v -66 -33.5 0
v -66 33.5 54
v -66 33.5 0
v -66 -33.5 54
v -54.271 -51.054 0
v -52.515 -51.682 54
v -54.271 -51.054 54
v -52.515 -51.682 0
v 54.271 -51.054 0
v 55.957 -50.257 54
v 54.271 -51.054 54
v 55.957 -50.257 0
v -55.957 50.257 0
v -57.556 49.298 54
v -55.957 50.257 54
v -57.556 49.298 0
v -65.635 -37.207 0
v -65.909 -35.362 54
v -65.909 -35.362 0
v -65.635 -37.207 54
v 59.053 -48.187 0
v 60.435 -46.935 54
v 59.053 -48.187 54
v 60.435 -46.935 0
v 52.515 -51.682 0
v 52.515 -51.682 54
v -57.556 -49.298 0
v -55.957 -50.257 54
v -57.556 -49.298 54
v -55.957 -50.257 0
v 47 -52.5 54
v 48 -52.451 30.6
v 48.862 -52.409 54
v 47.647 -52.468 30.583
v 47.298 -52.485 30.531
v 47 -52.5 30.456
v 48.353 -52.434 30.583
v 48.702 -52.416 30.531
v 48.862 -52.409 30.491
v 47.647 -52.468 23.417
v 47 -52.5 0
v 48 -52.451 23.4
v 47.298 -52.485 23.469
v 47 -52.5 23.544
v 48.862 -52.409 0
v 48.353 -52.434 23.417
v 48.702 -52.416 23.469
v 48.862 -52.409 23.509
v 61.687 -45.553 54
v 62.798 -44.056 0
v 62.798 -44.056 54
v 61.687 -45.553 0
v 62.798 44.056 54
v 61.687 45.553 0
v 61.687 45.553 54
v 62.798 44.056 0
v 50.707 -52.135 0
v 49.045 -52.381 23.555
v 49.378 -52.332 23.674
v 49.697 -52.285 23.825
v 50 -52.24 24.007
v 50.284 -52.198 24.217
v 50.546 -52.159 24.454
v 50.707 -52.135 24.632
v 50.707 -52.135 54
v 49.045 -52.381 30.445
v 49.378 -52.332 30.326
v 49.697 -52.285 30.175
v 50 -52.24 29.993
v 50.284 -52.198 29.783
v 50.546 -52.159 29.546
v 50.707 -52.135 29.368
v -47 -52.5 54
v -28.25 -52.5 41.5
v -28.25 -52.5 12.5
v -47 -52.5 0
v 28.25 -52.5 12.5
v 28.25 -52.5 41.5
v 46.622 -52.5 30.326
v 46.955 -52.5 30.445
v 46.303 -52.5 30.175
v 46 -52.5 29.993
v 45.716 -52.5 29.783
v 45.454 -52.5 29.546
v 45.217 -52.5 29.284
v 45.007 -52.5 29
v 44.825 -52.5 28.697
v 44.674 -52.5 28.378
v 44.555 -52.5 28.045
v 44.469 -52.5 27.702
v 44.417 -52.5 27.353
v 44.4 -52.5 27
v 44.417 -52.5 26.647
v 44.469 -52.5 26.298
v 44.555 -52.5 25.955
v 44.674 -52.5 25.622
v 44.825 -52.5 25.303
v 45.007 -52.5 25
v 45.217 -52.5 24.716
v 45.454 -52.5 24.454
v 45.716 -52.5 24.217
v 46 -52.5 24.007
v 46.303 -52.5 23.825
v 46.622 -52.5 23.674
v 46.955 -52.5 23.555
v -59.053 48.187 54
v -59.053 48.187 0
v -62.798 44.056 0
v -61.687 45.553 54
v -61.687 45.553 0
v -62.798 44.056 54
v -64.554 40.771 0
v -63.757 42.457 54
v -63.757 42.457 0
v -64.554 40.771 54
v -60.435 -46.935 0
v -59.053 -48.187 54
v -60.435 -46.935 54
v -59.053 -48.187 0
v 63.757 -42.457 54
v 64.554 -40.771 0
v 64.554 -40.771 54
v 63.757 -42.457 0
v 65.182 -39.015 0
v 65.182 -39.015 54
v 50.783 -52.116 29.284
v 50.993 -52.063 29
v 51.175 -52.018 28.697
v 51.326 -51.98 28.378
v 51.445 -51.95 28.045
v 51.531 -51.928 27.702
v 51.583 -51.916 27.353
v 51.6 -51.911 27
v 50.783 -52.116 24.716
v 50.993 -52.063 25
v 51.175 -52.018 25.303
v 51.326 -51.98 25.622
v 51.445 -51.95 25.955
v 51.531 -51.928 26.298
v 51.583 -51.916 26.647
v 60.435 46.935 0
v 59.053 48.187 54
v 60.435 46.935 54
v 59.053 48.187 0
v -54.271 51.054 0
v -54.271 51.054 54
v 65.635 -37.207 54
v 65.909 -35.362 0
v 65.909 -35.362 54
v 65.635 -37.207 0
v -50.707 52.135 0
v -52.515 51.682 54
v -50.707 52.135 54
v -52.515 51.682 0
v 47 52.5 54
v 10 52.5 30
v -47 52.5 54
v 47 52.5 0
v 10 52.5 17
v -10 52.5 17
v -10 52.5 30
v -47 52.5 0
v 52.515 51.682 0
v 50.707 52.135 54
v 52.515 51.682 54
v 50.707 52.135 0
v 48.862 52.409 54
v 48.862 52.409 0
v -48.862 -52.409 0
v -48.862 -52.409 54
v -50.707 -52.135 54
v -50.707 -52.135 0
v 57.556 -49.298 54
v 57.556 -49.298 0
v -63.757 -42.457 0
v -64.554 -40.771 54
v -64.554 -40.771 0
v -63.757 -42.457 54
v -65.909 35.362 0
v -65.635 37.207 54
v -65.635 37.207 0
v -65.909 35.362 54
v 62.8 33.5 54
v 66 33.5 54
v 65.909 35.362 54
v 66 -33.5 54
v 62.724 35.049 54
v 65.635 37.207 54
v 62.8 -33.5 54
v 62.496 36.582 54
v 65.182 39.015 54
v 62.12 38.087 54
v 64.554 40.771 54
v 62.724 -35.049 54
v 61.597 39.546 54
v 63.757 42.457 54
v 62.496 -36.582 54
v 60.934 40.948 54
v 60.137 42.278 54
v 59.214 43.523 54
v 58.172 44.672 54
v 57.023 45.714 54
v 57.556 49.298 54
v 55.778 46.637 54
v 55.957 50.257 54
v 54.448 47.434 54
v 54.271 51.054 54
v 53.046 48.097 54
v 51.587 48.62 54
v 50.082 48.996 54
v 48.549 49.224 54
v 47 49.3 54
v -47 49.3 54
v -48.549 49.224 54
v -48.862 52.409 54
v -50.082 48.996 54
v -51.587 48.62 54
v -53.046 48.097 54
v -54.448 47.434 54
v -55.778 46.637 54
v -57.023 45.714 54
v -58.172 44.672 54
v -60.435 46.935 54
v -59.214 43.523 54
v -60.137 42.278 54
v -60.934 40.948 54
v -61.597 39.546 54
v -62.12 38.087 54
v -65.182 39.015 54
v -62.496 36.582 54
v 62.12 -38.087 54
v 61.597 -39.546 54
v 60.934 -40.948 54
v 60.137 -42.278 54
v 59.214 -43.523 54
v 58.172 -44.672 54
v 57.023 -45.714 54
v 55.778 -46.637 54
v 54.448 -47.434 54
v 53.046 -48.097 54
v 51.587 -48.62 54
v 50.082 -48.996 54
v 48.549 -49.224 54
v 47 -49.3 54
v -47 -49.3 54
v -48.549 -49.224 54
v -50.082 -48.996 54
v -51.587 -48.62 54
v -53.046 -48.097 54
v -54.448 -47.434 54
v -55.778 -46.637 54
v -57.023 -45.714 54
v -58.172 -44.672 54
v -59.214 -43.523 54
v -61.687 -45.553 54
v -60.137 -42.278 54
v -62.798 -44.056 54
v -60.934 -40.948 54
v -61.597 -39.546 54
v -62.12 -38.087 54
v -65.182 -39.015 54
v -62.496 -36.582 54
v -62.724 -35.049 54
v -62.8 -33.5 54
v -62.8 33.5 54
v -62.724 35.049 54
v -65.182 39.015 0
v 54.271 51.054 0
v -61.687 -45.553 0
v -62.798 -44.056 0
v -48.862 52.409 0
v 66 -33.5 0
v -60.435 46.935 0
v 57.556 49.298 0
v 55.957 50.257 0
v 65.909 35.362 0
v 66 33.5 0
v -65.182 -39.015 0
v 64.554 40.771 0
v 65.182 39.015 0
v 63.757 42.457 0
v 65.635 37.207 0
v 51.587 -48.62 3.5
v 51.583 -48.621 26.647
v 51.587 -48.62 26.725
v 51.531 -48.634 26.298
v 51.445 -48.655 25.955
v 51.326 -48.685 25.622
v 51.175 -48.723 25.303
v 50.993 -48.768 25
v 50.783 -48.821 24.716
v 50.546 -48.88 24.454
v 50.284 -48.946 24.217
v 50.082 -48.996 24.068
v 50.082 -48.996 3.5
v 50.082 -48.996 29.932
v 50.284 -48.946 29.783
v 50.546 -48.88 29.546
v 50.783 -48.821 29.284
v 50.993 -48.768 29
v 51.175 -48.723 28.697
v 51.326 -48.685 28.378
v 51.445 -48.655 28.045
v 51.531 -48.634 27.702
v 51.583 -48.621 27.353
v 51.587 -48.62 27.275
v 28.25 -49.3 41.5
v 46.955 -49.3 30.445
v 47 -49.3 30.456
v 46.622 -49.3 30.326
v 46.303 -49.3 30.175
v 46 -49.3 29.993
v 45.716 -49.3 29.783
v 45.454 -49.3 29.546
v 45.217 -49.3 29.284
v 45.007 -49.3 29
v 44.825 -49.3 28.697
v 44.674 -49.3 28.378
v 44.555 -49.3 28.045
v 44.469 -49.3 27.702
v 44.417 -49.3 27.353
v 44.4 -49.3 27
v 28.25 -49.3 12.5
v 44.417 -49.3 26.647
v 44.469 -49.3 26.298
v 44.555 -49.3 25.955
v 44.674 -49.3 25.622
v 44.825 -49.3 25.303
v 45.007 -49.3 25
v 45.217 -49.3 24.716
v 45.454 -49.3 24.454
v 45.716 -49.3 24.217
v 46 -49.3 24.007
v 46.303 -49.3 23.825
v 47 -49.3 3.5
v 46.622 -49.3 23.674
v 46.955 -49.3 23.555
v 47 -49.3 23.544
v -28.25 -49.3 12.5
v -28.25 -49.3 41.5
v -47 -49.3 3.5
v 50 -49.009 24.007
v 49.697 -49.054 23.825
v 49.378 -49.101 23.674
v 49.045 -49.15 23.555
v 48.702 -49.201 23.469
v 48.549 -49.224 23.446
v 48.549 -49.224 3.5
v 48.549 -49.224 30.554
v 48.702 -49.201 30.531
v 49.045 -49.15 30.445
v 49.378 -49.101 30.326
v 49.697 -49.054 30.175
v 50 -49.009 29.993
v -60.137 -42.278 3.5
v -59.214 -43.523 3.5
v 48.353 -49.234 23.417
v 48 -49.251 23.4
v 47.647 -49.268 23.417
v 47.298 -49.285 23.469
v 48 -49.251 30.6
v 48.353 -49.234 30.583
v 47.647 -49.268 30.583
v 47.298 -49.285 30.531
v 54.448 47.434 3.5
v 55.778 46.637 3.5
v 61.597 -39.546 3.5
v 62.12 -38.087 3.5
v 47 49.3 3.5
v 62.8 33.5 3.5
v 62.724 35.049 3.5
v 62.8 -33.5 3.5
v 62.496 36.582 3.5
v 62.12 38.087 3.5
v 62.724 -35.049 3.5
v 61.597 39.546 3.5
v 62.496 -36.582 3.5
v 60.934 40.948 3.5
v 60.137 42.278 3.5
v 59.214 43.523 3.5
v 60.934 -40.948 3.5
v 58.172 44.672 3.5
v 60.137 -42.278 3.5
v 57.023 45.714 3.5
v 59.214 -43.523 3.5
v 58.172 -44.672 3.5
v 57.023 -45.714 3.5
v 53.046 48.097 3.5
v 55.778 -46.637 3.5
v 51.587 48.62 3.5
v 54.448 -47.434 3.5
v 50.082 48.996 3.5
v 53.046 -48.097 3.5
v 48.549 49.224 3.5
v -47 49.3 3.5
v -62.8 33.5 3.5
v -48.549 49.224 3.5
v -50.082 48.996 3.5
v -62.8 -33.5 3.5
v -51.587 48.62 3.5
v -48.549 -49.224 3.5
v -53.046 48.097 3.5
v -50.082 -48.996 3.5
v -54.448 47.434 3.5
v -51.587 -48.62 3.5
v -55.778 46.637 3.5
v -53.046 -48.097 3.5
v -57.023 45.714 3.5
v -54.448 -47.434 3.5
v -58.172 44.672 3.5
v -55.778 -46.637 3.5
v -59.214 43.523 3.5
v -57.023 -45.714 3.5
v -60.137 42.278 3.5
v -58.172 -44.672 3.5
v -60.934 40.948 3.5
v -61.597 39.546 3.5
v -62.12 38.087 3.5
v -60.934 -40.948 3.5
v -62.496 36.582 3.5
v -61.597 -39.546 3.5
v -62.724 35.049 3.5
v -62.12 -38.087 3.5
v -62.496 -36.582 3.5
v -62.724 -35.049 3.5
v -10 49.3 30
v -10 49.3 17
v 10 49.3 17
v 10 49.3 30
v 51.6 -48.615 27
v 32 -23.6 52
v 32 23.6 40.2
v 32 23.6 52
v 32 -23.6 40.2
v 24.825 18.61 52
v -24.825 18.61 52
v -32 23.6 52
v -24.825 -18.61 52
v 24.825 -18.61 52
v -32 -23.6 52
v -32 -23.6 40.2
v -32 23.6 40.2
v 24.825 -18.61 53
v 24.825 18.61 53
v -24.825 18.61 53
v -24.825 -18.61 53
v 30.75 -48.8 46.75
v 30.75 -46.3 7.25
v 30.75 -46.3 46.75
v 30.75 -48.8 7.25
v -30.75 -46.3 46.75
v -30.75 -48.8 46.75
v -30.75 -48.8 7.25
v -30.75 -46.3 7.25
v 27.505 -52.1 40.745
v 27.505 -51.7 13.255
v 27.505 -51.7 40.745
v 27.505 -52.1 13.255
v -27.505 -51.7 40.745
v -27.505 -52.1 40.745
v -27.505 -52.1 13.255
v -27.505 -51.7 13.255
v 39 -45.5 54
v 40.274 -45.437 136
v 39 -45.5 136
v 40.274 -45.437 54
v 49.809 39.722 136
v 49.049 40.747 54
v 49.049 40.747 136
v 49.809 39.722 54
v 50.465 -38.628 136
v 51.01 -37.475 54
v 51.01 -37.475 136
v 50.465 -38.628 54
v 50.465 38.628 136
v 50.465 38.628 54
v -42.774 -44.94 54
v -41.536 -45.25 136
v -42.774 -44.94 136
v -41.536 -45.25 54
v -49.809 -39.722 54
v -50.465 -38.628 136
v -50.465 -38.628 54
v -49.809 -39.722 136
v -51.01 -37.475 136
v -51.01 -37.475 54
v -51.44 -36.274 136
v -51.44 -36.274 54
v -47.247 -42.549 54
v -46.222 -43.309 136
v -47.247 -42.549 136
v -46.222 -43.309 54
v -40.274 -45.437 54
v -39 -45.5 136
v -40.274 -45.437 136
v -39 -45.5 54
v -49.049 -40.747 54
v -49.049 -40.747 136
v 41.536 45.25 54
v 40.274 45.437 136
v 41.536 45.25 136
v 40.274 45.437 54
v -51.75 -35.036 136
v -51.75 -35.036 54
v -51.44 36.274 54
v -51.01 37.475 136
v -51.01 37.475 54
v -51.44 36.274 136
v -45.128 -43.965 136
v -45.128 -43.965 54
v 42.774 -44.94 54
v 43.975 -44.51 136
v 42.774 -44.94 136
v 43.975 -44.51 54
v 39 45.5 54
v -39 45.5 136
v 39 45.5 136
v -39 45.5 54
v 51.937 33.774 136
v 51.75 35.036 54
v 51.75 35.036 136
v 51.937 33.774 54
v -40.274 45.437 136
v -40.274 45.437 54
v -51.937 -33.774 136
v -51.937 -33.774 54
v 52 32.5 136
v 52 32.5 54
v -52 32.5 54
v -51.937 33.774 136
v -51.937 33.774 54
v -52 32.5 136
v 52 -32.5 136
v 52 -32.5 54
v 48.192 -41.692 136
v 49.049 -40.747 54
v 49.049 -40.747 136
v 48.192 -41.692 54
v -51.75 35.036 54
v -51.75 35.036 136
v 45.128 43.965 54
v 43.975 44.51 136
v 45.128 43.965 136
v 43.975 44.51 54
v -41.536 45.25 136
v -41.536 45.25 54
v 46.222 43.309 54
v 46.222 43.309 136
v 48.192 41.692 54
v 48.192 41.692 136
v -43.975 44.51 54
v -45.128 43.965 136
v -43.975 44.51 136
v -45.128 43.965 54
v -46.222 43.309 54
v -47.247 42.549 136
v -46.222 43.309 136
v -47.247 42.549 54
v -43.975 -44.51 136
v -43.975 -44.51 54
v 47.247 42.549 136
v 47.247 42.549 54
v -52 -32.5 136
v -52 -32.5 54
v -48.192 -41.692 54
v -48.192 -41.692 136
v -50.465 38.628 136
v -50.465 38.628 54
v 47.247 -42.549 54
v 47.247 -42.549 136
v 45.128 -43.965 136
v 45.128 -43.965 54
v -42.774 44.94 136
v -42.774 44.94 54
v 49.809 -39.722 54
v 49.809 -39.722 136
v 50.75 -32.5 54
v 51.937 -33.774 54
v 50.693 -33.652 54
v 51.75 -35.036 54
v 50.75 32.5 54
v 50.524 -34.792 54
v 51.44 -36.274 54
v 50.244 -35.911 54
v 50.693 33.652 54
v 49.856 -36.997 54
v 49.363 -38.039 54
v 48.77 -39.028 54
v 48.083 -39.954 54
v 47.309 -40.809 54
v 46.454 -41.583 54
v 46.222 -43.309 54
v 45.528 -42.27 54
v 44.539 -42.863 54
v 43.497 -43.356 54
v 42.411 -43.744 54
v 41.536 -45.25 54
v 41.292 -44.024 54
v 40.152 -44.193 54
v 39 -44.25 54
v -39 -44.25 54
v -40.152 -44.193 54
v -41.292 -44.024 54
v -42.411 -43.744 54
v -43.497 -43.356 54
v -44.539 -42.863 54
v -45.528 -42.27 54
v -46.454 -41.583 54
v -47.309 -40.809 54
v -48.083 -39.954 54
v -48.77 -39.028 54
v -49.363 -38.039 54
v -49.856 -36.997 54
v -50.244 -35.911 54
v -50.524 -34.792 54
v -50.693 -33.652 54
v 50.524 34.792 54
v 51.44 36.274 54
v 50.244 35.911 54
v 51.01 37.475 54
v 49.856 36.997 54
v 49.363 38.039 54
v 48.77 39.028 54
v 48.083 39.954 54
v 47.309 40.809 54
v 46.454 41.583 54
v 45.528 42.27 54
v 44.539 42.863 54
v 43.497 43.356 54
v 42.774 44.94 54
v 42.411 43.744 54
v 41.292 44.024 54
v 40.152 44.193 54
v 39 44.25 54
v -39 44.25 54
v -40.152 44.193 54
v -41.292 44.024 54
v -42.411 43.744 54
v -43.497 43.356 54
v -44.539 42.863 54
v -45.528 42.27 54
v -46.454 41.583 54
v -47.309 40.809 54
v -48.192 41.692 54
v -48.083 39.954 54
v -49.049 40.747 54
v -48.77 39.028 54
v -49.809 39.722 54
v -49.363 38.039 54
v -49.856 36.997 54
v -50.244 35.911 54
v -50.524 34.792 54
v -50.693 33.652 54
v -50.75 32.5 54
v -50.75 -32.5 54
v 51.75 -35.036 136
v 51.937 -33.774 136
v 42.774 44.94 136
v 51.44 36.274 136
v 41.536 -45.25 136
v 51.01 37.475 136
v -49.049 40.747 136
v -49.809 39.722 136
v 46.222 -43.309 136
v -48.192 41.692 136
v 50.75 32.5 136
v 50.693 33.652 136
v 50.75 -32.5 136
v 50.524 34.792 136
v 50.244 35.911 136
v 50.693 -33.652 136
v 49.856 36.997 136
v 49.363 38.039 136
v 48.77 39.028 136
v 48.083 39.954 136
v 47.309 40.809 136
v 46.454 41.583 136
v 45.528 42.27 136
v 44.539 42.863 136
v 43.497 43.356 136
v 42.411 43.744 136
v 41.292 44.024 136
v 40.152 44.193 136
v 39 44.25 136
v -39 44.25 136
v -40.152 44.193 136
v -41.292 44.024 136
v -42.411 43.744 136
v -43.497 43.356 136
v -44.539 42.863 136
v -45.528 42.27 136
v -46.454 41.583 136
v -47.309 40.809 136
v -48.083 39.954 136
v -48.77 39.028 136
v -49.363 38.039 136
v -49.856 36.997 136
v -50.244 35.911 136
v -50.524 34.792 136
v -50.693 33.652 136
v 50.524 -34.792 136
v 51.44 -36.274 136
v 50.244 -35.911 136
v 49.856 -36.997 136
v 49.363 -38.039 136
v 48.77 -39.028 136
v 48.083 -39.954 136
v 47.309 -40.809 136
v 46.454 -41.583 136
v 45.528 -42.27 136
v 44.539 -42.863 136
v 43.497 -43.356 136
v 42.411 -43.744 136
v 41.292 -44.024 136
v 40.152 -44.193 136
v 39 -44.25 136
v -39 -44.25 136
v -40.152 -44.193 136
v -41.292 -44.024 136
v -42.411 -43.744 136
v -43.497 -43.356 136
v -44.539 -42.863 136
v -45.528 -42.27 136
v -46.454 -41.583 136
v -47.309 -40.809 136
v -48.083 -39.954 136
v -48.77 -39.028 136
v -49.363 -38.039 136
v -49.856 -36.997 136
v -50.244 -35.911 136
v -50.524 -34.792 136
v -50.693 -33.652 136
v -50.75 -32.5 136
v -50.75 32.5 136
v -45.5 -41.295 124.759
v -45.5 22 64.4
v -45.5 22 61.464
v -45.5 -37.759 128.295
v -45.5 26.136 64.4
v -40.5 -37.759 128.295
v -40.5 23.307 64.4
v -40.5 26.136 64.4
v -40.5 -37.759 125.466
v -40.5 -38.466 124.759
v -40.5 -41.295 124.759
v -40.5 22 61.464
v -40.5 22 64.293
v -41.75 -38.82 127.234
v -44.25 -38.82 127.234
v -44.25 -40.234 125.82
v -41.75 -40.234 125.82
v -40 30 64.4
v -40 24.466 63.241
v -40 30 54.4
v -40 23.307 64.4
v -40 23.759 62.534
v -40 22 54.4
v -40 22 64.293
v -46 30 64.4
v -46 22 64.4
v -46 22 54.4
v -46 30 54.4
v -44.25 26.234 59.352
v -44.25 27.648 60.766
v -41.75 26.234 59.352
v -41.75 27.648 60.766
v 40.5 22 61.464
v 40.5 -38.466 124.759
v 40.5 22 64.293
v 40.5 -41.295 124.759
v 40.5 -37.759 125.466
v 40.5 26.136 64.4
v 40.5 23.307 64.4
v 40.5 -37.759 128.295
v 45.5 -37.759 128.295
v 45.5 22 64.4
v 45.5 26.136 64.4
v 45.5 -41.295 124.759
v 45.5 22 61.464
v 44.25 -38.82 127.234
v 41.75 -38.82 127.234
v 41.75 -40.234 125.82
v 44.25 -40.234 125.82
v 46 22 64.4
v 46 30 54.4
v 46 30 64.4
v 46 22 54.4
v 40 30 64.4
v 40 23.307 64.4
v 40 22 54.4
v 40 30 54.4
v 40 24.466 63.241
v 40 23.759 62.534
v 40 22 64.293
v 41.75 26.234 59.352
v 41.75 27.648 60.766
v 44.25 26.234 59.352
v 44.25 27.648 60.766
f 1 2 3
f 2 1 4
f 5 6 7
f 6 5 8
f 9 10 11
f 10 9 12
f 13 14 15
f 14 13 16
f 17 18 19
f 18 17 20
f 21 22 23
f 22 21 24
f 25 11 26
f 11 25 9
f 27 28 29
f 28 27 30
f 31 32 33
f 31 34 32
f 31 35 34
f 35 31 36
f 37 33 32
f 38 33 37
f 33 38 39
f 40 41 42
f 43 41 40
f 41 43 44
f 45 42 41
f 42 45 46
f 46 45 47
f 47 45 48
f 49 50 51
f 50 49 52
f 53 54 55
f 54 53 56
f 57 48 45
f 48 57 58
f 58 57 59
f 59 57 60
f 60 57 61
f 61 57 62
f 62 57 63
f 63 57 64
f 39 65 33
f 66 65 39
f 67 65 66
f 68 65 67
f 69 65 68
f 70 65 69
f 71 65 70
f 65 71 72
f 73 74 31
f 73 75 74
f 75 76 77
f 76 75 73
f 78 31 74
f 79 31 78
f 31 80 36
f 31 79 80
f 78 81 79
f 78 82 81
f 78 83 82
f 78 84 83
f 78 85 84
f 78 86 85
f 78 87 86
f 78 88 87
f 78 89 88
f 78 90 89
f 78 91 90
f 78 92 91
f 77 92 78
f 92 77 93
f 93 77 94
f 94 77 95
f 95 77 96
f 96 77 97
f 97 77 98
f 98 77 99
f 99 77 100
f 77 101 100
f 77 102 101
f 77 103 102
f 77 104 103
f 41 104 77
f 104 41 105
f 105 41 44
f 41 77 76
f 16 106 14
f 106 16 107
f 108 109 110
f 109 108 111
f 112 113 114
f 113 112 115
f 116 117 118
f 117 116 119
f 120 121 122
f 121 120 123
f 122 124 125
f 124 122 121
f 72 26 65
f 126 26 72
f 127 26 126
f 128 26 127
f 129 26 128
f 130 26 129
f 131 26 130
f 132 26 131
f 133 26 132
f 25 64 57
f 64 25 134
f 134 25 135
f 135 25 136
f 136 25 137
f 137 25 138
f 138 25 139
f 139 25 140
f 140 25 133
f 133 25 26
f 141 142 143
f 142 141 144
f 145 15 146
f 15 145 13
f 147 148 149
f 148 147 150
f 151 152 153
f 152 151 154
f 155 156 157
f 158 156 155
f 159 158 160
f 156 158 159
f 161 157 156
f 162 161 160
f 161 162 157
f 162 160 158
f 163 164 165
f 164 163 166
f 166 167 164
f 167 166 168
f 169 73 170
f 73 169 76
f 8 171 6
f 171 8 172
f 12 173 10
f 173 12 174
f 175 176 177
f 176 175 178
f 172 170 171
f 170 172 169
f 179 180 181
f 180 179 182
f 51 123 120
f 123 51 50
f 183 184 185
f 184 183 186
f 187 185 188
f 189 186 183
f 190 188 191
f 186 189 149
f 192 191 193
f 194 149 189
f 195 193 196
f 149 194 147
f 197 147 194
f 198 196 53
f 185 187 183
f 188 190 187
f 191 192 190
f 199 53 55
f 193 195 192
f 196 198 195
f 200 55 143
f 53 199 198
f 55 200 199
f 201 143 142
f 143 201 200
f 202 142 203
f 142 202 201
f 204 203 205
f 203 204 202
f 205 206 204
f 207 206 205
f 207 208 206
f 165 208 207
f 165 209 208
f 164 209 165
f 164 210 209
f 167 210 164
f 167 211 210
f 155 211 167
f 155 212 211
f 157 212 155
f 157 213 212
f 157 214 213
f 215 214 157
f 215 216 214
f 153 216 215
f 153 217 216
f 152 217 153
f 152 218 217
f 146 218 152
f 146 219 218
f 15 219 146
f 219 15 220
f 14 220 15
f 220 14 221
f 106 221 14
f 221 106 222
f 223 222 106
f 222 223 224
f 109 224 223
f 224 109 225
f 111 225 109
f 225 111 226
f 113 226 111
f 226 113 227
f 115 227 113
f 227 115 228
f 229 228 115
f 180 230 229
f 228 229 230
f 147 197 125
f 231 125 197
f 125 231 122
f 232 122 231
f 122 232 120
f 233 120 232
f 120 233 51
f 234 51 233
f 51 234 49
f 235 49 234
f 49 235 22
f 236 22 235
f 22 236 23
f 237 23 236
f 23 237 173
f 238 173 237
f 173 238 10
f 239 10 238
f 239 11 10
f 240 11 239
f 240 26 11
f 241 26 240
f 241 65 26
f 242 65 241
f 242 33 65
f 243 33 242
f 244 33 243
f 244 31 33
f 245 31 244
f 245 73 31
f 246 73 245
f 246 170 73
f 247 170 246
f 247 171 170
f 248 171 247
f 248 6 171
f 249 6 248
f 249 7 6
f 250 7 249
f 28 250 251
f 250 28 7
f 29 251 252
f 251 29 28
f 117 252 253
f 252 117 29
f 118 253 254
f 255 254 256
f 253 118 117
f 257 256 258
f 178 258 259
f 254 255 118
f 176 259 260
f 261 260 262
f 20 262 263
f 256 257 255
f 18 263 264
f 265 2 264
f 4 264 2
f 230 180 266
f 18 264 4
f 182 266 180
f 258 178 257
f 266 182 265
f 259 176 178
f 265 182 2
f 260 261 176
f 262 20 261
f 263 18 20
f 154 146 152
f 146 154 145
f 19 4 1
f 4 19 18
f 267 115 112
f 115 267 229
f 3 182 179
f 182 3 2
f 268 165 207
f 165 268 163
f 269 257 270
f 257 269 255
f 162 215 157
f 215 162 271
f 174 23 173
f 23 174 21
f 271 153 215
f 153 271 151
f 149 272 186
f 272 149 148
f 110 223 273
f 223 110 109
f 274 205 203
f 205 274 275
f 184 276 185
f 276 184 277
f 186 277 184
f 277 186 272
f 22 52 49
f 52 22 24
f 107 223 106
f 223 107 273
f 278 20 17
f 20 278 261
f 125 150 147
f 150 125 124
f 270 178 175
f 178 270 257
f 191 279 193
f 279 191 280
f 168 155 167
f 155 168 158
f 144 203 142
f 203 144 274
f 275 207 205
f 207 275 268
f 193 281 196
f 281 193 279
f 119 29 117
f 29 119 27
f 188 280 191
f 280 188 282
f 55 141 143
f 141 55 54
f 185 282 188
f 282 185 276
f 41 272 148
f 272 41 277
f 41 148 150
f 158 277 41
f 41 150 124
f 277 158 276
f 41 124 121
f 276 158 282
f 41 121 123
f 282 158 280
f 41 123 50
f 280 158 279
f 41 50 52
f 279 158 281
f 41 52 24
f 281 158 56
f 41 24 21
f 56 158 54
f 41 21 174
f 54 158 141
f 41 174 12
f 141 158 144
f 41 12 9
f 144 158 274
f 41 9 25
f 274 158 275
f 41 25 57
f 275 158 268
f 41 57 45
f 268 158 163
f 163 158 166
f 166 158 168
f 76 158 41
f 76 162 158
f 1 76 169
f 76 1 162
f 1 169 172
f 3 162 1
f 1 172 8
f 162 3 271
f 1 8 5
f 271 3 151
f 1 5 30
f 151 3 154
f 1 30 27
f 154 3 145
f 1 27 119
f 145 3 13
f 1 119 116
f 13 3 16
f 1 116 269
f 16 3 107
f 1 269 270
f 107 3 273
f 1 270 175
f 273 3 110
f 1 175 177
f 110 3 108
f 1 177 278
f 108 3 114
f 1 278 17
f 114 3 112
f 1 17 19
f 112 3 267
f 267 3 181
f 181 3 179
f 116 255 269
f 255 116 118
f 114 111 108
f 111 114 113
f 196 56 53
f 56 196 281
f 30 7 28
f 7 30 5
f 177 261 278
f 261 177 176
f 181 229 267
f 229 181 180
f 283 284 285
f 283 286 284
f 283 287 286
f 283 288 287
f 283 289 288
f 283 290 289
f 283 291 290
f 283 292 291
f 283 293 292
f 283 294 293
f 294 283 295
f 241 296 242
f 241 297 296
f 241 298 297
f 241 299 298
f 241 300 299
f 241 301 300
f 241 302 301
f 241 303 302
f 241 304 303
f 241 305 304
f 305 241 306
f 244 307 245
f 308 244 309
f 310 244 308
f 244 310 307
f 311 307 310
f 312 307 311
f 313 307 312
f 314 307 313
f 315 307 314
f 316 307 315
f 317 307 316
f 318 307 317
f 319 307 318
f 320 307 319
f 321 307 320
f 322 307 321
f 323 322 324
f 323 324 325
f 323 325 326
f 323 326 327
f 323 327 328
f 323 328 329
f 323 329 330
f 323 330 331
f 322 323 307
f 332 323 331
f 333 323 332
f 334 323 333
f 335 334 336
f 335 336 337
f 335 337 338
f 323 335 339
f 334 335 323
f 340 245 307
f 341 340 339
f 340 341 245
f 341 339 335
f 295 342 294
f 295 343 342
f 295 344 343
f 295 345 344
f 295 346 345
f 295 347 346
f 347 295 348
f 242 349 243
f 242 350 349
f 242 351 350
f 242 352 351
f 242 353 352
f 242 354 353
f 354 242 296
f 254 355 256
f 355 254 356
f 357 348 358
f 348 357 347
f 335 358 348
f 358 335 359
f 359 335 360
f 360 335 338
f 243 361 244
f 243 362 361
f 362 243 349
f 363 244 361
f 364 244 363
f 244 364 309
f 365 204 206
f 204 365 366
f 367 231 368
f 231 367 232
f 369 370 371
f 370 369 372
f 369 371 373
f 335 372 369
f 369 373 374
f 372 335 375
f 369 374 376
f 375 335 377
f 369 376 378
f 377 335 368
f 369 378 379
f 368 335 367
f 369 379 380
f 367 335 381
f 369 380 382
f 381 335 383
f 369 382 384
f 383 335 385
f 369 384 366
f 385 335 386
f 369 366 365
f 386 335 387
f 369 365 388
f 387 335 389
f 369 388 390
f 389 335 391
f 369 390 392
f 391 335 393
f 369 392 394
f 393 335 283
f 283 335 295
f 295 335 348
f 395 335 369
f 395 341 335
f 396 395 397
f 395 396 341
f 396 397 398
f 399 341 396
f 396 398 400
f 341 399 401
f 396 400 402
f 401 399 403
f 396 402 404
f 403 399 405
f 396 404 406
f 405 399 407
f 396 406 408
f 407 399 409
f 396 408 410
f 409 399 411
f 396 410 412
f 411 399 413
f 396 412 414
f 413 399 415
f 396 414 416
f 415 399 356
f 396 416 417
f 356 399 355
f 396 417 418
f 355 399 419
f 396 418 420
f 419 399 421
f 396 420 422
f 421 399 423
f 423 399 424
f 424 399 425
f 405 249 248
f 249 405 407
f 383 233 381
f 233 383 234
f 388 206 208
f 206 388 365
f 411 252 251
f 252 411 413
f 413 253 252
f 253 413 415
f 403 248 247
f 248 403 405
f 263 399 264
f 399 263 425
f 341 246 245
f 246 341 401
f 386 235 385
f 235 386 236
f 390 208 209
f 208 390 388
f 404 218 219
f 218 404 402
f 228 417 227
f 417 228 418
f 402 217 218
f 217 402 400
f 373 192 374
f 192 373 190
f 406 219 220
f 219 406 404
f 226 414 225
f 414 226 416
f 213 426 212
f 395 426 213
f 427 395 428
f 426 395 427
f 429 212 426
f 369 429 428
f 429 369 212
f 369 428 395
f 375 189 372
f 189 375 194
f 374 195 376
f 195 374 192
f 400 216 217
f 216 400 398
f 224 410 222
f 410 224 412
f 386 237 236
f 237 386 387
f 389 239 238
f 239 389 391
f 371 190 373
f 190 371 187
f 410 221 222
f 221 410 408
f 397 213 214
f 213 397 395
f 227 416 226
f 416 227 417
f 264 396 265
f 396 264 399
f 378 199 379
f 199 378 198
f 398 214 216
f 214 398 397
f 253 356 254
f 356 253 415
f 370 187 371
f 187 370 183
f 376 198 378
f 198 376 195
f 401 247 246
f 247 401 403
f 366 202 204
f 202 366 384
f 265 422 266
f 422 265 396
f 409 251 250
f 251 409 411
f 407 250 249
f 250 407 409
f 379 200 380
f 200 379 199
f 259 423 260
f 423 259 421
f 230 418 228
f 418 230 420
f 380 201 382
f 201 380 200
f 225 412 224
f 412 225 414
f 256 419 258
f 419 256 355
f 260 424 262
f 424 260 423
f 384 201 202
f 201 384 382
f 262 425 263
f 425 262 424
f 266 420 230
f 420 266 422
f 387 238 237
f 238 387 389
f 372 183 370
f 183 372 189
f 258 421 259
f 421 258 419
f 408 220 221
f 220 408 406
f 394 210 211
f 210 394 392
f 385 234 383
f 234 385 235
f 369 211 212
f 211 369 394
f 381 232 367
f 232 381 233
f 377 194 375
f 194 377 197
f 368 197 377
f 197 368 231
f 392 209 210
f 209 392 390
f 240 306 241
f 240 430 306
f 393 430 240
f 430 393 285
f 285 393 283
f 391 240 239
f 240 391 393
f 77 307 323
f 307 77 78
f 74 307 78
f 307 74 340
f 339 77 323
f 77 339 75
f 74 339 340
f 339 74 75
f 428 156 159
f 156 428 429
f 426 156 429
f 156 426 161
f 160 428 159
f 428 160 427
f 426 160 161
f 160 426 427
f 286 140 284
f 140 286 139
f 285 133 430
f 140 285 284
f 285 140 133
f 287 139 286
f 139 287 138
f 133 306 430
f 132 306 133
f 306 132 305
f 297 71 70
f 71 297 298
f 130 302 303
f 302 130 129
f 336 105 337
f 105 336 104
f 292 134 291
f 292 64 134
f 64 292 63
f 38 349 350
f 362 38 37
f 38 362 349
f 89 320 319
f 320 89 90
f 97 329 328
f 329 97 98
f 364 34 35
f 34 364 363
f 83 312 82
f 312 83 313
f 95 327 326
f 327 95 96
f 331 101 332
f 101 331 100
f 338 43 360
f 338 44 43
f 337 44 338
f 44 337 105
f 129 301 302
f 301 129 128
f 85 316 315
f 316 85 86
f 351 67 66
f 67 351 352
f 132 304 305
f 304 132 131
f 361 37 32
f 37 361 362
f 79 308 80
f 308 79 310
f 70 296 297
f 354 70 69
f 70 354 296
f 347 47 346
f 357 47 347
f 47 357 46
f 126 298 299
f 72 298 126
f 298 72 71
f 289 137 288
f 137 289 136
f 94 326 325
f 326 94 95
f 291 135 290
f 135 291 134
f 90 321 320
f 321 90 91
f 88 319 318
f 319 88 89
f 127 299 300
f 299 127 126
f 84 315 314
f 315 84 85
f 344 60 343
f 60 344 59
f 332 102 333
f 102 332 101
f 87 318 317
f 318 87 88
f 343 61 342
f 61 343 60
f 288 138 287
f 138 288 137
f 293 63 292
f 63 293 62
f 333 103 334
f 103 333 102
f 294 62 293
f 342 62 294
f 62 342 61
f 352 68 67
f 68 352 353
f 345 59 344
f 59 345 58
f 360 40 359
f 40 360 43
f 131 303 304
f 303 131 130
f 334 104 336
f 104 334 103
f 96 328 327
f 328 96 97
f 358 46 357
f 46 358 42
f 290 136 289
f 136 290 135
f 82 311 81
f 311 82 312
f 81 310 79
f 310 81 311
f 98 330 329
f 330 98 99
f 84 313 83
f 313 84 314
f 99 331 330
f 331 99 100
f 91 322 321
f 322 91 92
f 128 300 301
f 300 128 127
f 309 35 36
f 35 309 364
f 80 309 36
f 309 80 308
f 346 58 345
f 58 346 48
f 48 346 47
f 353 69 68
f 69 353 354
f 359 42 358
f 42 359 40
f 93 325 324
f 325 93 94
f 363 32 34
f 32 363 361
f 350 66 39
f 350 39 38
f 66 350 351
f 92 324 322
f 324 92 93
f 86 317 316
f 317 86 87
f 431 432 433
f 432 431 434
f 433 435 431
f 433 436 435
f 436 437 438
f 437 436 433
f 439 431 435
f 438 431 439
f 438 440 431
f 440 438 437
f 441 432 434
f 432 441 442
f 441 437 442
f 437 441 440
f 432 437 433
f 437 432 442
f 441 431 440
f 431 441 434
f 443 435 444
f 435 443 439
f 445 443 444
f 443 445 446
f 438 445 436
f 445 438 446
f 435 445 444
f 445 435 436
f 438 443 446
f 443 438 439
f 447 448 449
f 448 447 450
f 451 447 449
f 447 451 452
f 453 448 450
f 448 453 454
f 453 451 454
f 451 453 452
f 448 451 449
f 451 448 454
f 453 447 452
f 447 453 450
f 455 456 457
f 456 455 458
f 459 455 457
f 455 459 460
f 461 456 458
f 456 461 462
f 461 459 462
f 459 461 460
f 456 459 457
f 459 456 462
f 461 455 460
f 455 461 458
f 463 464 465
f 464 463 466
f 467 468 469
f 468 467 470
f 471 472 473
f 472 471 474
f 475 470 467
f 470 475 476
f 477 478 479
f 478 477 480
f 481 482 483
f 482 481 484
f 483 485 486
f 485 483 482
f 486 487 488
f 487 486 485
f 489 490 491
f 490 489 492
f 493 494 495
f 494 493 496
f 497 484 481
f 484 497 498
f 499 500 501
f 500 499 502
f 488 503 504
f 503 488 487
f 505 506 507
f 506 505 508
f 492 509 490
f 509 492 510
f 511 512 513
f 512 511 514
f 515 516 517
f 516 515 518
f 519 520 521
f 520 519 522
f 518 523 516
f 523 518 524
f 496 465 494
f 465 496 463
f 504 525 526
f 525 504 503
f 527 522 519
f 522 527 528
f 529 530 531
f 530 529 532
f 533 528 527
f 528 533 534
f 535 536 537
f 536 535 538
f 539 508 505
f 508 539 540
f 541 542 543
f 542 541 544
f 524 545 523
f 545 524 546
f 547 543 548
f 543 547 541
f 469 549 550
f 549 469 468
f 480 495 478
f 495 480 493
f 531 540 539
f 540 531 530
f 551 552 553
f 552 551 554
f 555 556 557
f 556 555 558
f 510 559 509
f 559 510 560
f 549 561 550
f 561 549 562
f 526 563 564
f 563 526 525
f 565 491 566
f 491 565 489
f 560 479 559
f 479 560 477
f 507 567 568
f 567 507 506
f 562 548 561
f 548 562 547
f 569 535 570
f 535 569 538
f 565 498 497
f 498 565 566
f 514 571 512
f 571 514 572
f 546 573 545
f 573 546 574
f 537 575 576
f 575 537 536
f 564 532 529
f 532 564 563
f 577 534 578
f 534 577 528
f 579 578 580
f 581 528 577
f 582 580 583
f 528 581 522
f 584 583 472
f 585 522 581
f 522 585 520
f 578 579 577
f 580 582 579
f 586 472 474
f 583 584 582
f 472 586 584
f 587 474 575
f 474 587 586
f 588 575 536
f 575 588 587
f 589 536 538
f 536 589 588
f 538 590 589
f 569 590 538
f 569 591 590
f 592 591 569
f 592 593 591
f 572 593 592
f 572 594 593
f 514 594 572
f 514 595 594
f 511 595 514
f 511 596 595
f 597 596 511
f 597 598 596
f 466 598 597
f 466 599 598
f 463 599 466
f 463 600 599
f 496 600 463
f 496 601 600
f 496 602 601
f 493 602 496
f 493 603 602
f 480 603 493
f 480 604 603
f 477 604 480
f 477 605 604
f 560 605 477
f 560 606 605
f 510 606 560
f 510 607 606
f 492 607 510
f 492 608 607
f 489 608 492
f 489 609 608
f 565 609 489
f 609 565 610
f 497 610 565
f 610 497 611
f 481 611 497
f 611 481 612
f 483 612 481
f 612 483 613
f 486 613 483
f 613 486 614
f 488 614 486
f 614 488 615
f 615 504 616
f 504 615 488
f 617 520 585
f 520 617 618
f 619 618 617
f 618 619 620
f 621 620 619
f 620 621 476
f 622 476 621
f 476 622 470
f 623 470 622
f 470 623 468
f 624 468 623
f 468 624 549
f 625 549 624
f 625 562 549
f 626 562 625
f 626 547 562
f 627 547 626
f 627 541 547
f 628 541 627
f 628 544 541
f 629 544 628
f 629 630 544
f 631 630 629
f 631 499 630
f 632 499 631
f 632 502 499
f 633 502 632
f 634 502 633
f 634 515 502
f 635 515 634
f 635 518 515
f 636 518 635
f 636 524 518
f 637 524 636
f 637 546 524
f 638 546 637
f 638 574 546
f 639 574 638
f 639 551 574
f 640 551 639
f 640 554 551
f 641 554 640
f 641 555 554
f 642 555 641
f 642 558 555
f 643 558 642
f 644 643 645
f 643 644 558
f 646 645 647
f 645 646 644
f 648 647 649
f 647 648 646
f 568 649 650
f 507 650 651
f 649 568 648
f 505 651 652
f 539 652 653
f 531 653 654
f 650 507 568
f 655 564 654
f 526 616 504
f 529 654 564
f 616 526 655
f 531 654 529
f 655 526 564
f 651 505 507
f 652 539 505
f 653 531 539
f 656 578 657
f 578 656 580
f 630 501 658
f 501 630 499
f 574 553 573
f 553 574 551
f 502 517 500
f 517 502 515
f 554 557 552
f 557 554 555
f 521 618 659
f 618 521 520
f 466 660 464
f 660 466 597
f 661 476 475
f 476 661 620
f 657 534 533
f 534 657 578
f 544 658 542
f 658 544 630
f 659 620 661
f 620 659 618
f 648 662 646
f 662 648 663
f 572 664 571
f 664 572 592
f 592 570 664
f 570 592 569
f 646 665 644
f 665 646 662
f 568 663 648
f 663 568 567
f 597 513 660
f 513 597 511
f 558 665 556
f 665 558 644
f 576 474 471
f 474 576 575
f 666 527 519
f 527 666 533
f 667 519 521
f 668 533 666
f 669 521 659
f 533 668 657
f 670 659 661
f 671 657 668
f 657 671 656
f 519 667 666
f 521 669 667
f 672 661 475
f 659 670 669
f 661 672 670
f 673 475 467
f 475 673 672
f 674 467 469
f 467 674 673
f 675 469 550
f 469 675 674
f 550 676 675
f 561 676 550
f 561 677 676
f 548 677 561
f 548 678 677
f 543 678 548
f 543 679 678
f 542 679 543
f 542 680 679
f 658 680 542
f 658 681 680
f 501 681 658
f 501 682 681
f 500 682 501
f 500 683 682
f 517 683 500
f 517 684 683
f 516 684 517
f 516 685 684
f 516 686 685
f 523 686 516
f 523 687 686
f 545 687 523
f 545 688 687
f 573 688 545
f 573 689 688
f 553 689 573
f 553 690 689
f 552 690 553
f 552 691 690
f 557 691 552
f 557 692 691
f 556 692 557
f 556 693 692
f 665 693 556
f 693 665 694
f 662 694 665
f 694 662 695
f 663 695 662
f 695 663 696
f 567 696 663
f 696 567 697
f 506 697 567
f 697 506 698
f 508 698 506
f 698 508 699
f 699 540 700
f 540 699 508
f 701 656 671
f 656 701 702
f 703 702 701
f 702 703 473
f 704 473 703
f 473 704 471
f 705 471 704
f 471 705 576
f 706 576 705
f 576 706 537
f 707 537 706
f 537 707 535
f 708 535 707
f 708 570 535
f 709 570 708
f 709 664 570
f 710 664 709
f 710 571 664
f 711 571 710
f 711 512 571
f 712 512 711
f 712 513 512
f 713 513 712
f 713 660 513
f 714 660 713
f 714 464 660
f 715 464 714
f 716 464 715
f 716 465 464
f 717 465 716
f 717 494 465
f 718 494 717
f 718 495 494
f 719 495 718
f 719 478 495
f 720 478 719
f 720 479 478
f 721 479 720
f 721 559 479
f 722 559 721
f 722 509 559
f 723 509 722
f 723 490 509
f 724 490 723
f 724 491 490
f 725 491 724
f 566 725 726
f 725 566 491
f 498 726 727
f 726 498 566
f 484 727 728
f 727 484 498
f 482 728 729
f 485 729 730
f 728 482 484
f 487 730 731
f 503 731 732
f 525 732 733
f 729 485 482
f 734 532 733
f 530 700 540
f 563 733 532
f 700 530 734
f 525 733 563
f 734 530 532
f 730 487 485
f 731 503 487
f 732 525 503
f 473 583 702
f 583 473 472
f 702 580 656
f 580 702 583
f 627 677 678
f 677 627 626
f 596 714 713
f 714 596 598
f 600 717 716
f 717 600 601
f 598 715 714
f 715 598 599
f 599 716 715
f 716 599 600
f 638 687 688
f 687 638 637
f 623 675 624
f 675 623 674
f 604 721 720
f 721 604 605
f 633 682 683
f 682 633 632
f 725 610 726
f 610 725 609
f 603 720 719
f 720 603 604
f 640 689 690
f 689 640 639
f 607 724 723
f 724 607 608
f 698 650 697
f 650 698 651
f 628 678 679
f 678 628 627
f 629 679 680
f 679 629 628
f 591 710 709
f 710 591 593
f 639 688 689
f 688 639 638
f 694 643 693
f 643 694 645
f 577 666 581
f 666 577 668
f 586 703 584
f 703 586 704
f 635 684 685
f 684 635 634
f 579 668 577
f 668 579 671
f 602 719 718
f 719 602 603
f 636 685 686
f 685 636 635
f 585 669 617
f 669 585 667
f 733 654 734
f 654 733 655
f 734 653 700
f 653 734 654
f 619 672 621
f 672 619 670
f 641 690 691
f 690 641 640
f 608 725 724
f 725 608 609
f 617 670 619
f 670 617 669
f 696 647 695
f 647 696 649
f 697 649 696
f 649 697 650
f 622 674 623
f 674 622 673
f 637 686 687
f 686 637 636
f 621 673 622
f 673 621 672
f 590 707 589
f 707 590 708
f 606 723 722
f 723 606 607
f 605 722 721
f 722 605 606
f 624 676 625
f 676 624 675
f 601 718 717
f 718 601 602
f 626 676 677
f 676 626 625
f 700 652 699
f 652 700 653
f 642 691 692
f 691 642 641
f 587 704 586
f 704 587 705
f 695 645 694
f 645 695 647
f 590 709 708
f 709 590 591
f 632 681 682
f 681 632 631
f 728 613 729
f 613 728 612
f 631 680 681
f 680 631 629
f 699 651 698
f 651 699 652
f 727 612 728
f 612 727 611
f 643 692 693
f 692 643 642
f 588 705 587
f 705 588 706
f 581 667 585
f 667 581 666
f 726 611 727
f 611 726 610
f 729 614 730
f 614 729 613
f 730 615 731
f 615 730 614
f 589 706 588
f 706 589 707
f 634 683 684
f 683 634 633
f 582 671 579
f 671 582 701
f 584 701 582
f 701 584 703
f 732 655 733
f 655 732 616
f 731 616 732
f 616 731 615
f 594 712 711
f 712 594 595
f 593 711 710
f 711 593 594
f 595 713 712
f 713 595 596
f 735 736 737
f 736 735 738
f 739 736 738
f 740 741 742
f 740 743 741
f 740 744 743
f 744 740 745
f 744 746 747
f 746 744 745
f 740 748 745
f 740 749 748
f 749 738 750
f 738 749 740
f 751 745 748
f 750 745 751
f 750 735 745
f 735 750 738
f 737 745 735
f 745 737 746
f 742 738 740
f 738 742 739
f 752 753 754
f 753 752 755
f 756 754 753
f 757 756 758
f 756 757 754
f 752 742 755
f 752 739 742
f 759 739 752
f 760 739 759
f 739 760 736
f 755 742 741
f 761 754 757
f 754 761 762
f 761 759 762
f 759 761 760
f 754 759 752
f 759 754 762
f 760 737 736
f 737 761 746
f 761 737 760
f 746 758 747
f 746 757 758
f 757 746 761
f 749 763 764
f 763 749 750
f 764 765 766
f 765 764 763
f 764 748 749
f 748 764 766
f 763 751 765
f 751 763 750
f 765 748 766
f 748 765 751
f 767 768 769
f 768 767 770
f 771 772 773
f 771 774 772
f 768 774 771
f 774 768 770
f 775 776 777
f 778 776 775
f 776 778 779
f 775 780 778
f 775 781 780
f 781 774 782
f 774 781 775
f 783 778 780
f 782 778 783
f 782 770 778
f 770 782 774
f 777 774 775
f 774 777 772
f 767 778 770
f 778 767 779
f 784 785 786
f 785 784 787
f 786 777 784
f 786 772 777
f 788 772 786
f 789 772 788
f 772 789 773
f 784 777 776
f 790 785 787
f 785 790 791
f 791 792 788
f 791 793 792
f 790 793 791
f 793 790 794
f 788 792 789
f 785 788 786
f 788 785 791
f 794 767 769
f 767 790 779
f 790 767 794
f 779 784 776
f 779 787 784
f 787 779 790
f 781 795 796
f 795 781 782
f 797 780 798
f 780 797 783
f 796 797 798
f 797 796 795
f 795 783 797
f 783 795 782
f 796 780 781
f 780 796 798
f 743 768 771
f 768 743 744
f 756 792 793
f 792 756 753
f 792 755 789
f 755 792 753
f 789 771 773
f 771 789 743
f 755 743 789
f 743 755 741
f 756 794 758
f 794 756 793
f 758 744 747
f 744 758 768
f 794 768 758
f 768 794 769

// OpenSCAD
// Rev D dimensional envelope and trial optical rails. NOT approved final-fit print.
$fn=64; MODE="assembly";
W=132;D=105;H=54;R=19;WALL=3.2;FLOOR=3.5;
CW=104;CD=91;CH=82; // clear 5-face canopy TARGET, not vendor-quoted
PLATE_W=82;PLATE_LEN=88;PLATE_T=1;PLATE_Y=-7;PLATE_Z=94;ANGLE=45;
OLED_PCB_W=61.5;OLED_PCB_H=39.5;OLED_ACTIVE_W=55.01;OLED_ACTIVE_H=27.49;
AMOLED_W=64;AMOLED_D=47.2;AMOLED_H=11.8;
module rr(w,d,r){offset(r=r)square([w-2*r,d-2*r],center=true);}
module base(){difference(){
linear_extrude(height=H)rr(W,D,R);
translate([0,0,FLOOR])linear_extrude(height=H+2)rr(W-2*WALL,D-2*WALL,R-WALL);
translate([-28.25,-D/2-1,H/2-14.5])cube([56.5,WALL+3,29]);
translate([-10,D/2-WALL-1,17])cube([20,WALL+3,13]); // USB notch NOT measured
translate([48,-D/2-1,H/2])rotate([-90,0,0])cylinder(h=WALL+3,d=7.2); // encoder TBD
}}
module source(){color([.11,.12,.15])translate([-AMOLED_W/2,-AMOLED_D/2,H-AMOLED_H-2])cube([AMOLED_W,AMOLED_D,AMOLED_H]);color([.4,.2,.6])translate([-49.65/2,-37.22/2,H-2])cube([49.65,37.22,1]);}
module oled(){color([.1,.1,.16])translate([-OLED_PCB_W/2,-D/2+WALL+.5,H/2-OLED_PCB_H/2])cube([OLED_PCB_W,2.5,OLED_PCB_H]);color([.6,.65,.7])translate([-OLED_ACTIVE_W/2,-D/2+.4,H/2-OLED_ACTIVE_H/2])cube([OLED_ACTIVE_W,.4,OLED_ACTIVE_H]);}
module optics(){color([.63,.8,.92,.28])translate([0,PLATE_Y,PLATE_Z])rotate([ANGLE,0,0])cube([PLATE_W,PLATE_T,PLATE_LEN],center=true);}
module transparent_cover(){color([.75,.84,1,.2])translate([0,0,H+CH/2])difference(){linear_extrude(height=CH,center=true)rr(CW,CD,13);linear_extrude(height=CH+1,center=true)rr(CW-2.5,CD-2.5,11.75);}}
module rail(x){color([.93,.89,.86])difference(){union(){
translate([x,PLATE_Y,PLATE_Z])rotate([ANGLE,0,0])cube([5,5,PLATE_LEN+4],center=true);
translate([x-3,22,H+.4])cube([6,8,10]);}
translate([x,PLATE_Y,PLATE_Z])rotate([ANGLE,0,0])cube([2.5,2.0,PLATE_LEN+8],center=true);}}
if(MODE=="base")base();
else if(MODE=="rails"){rail(-PLATE_W/2-2);rail(PLATE_W/2+2);}
else if(MODE=="optics"){optics();rail(-PLATE_W/2-2);rail(PLATE_W/2+2);}
else if(MODE=="assembly"){color([.95,.91,.85])base();source();oled();transparent_cover();optics();rail(-PLATE_W/2-2);rail(PLATE_W/2+2);}
else assert(false,"unknown MODE");
